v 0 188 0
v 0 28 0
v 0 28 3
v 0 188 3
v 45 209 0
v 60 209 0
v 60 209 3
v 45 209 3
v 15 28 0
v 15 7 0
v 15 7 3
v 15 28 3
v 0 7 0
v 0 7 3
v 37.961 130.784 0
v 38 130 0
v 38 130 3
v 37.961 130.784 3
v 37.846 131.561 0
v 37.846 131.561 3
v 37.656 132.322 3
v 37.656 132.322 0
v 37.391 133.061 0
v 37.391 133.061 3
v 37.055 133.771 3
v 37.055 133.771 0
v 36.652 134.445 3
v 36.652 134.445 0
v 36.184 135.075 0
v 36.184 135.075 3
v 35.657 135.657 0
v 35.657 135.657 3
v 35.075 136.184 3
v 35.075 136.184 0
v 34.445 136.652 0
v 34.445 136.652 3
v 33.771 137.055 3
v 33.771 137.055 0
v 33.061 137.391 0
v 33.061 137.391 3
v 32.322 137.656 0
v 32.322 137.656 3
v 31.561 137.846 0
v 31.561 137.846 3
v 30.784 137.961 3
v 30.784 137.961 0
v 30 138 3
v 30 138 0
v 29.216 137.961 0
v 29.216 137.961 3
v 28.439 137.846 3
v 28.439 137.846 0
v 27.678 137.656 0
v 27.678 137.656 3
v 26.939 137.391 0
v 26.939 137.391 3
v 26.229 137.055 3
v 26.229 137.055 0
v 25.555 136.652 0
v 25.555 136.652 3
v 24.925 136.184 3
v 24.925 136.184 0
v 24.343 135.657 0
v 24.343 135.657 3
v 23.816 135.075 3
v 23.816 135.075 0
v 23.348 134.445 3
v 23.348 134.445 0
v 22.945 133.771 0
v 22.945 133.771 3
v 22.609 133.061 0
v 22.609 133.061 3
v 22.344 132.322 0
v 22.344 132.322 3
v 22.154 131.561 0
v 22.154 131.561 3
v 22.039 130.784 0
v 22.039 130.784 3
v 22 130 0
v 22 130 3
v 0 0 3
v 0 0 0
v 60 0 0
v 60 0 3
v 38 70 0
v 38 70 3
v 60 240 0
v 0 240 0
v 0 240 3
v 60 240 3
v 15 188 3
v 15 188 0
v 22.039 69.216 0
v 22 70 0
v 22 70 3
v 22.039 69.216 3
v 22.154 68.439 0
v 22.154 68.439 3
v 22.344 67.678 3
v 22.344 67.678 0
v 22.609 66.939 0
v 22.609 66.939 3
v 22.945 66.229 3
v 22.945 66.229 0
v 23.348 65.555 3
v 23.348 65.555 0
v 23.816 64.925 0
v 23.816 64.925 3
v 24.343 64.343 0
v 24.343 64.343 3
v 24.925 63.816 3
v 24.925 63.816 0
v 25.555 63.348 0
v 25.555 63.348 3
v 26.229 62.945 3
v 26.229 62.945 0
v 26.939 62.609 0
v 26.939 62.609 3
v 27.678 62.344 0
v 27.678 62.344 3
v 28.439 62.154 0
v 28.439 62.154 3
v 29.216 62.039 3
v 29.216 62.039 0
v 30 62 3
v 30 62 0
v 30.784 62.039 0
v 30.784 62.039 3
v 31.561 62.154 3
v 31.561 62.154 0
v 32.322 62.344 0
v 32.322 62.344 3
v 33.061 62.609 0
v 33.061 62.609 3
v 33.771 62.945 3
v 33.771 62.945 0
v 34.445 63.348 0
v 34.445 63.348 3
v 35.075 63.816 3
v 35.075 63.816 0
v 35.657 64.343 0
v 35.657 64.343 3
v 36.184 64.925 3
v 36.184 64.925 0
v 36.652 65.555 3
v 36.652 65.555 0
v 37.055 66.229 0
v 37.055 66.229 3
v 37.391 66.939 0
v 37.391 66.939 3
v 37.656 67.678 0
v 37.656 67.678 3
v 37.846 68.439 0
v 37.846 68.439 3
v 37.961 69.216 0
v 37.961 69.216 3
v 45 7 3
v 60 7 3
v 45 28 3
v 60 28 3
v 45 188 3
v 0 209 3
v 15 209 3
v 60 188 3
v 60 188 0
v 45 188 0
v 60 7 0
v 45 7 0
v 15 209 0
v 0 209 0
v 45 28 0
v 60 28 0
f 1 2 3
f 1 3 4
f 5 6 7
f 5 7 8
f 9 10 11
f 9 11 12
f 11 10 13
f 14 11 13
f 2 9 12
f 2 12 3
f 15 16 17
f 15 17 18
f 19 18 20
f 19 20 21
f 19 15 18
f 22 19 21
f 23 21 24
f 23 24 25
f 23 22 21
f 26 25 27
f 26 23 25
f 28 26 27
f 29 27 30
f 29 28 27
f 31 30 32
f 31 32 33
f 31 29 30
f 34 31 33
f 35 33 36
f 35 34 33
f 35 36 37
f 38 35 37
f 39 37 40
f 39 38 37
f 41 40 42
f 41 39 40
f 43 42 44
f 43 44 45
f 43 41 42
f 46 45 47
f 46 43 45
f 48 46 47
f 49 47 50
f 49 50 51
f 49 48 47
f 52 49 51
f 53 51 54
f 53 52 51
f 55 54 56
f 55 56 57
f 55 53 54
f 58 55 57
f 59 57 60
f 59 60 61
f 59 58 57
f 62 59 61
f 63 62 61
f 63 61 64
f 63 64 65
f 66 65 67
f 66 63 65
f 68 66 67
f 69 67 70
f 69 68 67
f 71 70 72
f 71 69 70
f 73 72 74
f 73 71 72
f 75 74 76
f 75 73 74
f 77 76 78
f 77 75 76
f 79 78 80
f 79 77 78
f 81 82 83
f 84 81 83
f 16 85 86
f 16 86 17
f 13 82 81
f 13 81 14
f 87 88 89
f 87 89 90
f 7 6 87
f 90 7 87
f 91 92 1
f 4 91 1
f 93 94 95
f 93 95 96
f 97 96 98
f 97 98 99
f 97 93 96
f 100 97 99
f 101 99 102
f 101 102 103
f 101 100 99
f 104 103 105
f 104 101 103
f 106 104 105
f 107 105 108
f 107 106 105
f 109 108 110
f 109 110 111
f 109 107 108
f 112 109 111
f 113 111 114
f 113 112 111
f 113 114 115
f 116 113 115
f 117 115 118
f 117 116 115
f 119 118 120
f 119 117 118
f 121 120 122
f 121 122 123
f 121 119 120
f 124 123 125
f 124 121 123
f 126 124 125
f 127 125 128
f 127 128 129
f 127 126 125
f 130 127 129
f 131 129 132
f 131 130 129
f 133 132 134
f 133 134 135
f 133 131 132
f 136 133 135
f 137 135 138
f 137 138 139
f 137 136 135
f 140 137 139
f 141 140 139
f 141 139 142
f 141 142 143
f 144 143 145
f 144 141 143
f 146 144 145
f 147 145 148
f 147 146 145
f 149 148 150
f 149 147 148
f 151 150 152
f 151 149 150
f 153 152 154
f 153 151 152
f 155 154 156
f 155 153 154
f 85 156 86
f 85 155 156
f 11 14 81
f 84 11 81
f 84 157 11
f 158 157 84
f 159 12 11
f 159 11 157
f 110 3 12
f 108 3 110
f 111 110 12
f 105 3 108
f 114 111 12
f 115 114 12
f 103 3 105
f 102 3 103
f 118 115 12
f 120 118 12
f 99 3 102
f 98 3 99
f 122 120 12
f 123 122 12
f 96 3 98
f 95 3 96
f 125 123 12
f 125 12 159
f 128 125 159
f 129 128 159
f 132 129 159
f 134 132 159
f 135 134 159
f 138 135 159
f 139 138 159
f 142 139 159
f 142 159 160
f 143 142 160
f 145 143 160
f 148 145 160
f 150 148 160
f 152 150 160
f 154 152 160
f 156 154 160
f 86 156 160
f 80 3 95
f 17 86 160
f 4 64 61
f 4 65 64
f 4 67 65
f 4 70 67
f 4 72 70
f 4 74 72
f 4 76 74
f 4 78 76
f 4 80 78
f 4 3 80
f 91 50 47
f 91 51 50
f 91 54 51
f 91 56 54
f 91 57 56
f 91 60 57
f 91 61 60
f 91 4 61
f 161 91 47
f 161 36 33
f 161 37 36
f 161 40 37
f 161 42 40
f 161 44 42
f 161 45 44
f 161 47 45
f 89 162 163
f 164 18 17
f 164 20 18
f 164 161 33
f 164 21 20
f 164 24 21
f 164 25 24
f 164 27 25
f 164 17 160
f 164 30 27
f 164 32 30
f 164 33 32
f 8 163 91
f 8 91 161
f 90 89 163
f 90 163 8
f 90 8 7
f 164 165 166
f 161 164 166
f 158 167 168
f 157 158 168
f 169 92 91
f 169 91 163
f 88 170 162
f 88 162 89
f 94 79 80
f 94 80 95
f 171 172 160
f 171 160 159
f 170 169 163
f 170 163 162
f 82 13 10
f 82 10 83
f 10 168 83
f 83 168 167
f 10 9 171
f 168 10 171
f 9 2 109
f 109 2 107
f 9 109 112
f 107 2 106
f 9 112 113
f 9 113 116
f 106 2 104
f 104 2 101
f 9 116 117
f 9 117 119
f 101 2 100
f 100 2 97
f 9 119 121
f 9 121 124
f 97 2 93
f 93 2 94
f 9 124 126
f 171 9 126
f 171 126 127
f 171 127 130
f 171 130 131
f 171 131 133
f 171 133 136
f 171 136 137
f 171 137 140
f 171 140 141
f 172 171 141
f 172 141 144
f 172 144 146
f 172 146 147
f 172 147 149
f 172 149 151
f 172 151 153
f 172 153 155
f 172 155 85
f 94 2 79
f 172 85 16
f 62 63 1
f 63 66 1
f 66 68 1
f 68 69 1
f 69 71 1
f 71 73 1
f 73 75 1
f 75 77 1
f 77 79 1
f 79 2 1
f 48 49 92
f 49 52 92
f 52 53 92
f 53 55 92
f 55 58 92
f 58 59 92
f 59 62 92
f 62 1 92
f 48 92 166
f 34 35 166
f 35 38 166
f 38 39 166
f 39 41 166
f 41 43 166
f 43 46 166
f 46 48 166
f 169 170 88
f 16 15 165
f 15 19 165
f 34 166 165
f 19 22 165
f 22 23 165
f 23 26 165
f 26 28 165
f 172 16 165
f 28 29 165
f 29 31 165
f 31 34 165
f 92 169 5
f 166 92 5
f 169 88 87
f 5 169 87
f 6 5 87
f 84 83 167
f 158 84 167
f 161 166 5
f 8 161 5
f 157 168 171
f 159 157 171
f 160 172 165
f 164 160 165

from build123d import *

# Parameters (mm, degrees)
SKETCH_1_W          = 60
SKETCH_1_H          = 240
EXTRUDE_1_DEPTH     = 3
SKETCH_4_W          = 15
SKETCH_4_H          = 21
CUT_EXTRUDE_1_DEPTH = 3


with BuildPart() as part:
    # 草图1 → 凸台-拉伸1 (new body)
    with BuildSketch(Plane.XY):
        with Locations((30, 120)):
            Rectangle(SKETCH_1_W, SKETCH_1_H)
    extrude(amount=EXTRUDE_1_DEPTH)

    # 草图4 → 切除-拉伸1 (cut)
    with BuildSketch(Plane(origin=(0, 0, 0), x_dir=(-1, 0, 0), z_dir=(0, 0, -1))):
        with Locations((-52.5, 17.5)):
            Rectangle(SKETCH_4_W, SKETCH_4_H)
        with Locations((-7.5, 17.5)):
            Rectangle(SKETCH_4_W, SKETCH_4_H)
        with Locations((-7.5, 198.5)):
            Rectangle(SKETCH_4_W, SKETCH_4_H)
        with Locations((-52.5, 198.5)):
            Rectangle(SKETCH_4_W, SKETCH_4_H)
        with BuildLine():
            Line((-22, 130), (-22, 70))
            ThreePointArc((-22, 70), (-30, 62), (-38, 70))
            Line((-38, 70), (-38, 130))
            ThreePointArc((-38, 130), (-30, 138), (-22, 130))
        make_face()
    extrude(amount=-CUT_EXTRUDE_1_DEPTH, mode=Mode.SUBTRACT)


solid = part.part
